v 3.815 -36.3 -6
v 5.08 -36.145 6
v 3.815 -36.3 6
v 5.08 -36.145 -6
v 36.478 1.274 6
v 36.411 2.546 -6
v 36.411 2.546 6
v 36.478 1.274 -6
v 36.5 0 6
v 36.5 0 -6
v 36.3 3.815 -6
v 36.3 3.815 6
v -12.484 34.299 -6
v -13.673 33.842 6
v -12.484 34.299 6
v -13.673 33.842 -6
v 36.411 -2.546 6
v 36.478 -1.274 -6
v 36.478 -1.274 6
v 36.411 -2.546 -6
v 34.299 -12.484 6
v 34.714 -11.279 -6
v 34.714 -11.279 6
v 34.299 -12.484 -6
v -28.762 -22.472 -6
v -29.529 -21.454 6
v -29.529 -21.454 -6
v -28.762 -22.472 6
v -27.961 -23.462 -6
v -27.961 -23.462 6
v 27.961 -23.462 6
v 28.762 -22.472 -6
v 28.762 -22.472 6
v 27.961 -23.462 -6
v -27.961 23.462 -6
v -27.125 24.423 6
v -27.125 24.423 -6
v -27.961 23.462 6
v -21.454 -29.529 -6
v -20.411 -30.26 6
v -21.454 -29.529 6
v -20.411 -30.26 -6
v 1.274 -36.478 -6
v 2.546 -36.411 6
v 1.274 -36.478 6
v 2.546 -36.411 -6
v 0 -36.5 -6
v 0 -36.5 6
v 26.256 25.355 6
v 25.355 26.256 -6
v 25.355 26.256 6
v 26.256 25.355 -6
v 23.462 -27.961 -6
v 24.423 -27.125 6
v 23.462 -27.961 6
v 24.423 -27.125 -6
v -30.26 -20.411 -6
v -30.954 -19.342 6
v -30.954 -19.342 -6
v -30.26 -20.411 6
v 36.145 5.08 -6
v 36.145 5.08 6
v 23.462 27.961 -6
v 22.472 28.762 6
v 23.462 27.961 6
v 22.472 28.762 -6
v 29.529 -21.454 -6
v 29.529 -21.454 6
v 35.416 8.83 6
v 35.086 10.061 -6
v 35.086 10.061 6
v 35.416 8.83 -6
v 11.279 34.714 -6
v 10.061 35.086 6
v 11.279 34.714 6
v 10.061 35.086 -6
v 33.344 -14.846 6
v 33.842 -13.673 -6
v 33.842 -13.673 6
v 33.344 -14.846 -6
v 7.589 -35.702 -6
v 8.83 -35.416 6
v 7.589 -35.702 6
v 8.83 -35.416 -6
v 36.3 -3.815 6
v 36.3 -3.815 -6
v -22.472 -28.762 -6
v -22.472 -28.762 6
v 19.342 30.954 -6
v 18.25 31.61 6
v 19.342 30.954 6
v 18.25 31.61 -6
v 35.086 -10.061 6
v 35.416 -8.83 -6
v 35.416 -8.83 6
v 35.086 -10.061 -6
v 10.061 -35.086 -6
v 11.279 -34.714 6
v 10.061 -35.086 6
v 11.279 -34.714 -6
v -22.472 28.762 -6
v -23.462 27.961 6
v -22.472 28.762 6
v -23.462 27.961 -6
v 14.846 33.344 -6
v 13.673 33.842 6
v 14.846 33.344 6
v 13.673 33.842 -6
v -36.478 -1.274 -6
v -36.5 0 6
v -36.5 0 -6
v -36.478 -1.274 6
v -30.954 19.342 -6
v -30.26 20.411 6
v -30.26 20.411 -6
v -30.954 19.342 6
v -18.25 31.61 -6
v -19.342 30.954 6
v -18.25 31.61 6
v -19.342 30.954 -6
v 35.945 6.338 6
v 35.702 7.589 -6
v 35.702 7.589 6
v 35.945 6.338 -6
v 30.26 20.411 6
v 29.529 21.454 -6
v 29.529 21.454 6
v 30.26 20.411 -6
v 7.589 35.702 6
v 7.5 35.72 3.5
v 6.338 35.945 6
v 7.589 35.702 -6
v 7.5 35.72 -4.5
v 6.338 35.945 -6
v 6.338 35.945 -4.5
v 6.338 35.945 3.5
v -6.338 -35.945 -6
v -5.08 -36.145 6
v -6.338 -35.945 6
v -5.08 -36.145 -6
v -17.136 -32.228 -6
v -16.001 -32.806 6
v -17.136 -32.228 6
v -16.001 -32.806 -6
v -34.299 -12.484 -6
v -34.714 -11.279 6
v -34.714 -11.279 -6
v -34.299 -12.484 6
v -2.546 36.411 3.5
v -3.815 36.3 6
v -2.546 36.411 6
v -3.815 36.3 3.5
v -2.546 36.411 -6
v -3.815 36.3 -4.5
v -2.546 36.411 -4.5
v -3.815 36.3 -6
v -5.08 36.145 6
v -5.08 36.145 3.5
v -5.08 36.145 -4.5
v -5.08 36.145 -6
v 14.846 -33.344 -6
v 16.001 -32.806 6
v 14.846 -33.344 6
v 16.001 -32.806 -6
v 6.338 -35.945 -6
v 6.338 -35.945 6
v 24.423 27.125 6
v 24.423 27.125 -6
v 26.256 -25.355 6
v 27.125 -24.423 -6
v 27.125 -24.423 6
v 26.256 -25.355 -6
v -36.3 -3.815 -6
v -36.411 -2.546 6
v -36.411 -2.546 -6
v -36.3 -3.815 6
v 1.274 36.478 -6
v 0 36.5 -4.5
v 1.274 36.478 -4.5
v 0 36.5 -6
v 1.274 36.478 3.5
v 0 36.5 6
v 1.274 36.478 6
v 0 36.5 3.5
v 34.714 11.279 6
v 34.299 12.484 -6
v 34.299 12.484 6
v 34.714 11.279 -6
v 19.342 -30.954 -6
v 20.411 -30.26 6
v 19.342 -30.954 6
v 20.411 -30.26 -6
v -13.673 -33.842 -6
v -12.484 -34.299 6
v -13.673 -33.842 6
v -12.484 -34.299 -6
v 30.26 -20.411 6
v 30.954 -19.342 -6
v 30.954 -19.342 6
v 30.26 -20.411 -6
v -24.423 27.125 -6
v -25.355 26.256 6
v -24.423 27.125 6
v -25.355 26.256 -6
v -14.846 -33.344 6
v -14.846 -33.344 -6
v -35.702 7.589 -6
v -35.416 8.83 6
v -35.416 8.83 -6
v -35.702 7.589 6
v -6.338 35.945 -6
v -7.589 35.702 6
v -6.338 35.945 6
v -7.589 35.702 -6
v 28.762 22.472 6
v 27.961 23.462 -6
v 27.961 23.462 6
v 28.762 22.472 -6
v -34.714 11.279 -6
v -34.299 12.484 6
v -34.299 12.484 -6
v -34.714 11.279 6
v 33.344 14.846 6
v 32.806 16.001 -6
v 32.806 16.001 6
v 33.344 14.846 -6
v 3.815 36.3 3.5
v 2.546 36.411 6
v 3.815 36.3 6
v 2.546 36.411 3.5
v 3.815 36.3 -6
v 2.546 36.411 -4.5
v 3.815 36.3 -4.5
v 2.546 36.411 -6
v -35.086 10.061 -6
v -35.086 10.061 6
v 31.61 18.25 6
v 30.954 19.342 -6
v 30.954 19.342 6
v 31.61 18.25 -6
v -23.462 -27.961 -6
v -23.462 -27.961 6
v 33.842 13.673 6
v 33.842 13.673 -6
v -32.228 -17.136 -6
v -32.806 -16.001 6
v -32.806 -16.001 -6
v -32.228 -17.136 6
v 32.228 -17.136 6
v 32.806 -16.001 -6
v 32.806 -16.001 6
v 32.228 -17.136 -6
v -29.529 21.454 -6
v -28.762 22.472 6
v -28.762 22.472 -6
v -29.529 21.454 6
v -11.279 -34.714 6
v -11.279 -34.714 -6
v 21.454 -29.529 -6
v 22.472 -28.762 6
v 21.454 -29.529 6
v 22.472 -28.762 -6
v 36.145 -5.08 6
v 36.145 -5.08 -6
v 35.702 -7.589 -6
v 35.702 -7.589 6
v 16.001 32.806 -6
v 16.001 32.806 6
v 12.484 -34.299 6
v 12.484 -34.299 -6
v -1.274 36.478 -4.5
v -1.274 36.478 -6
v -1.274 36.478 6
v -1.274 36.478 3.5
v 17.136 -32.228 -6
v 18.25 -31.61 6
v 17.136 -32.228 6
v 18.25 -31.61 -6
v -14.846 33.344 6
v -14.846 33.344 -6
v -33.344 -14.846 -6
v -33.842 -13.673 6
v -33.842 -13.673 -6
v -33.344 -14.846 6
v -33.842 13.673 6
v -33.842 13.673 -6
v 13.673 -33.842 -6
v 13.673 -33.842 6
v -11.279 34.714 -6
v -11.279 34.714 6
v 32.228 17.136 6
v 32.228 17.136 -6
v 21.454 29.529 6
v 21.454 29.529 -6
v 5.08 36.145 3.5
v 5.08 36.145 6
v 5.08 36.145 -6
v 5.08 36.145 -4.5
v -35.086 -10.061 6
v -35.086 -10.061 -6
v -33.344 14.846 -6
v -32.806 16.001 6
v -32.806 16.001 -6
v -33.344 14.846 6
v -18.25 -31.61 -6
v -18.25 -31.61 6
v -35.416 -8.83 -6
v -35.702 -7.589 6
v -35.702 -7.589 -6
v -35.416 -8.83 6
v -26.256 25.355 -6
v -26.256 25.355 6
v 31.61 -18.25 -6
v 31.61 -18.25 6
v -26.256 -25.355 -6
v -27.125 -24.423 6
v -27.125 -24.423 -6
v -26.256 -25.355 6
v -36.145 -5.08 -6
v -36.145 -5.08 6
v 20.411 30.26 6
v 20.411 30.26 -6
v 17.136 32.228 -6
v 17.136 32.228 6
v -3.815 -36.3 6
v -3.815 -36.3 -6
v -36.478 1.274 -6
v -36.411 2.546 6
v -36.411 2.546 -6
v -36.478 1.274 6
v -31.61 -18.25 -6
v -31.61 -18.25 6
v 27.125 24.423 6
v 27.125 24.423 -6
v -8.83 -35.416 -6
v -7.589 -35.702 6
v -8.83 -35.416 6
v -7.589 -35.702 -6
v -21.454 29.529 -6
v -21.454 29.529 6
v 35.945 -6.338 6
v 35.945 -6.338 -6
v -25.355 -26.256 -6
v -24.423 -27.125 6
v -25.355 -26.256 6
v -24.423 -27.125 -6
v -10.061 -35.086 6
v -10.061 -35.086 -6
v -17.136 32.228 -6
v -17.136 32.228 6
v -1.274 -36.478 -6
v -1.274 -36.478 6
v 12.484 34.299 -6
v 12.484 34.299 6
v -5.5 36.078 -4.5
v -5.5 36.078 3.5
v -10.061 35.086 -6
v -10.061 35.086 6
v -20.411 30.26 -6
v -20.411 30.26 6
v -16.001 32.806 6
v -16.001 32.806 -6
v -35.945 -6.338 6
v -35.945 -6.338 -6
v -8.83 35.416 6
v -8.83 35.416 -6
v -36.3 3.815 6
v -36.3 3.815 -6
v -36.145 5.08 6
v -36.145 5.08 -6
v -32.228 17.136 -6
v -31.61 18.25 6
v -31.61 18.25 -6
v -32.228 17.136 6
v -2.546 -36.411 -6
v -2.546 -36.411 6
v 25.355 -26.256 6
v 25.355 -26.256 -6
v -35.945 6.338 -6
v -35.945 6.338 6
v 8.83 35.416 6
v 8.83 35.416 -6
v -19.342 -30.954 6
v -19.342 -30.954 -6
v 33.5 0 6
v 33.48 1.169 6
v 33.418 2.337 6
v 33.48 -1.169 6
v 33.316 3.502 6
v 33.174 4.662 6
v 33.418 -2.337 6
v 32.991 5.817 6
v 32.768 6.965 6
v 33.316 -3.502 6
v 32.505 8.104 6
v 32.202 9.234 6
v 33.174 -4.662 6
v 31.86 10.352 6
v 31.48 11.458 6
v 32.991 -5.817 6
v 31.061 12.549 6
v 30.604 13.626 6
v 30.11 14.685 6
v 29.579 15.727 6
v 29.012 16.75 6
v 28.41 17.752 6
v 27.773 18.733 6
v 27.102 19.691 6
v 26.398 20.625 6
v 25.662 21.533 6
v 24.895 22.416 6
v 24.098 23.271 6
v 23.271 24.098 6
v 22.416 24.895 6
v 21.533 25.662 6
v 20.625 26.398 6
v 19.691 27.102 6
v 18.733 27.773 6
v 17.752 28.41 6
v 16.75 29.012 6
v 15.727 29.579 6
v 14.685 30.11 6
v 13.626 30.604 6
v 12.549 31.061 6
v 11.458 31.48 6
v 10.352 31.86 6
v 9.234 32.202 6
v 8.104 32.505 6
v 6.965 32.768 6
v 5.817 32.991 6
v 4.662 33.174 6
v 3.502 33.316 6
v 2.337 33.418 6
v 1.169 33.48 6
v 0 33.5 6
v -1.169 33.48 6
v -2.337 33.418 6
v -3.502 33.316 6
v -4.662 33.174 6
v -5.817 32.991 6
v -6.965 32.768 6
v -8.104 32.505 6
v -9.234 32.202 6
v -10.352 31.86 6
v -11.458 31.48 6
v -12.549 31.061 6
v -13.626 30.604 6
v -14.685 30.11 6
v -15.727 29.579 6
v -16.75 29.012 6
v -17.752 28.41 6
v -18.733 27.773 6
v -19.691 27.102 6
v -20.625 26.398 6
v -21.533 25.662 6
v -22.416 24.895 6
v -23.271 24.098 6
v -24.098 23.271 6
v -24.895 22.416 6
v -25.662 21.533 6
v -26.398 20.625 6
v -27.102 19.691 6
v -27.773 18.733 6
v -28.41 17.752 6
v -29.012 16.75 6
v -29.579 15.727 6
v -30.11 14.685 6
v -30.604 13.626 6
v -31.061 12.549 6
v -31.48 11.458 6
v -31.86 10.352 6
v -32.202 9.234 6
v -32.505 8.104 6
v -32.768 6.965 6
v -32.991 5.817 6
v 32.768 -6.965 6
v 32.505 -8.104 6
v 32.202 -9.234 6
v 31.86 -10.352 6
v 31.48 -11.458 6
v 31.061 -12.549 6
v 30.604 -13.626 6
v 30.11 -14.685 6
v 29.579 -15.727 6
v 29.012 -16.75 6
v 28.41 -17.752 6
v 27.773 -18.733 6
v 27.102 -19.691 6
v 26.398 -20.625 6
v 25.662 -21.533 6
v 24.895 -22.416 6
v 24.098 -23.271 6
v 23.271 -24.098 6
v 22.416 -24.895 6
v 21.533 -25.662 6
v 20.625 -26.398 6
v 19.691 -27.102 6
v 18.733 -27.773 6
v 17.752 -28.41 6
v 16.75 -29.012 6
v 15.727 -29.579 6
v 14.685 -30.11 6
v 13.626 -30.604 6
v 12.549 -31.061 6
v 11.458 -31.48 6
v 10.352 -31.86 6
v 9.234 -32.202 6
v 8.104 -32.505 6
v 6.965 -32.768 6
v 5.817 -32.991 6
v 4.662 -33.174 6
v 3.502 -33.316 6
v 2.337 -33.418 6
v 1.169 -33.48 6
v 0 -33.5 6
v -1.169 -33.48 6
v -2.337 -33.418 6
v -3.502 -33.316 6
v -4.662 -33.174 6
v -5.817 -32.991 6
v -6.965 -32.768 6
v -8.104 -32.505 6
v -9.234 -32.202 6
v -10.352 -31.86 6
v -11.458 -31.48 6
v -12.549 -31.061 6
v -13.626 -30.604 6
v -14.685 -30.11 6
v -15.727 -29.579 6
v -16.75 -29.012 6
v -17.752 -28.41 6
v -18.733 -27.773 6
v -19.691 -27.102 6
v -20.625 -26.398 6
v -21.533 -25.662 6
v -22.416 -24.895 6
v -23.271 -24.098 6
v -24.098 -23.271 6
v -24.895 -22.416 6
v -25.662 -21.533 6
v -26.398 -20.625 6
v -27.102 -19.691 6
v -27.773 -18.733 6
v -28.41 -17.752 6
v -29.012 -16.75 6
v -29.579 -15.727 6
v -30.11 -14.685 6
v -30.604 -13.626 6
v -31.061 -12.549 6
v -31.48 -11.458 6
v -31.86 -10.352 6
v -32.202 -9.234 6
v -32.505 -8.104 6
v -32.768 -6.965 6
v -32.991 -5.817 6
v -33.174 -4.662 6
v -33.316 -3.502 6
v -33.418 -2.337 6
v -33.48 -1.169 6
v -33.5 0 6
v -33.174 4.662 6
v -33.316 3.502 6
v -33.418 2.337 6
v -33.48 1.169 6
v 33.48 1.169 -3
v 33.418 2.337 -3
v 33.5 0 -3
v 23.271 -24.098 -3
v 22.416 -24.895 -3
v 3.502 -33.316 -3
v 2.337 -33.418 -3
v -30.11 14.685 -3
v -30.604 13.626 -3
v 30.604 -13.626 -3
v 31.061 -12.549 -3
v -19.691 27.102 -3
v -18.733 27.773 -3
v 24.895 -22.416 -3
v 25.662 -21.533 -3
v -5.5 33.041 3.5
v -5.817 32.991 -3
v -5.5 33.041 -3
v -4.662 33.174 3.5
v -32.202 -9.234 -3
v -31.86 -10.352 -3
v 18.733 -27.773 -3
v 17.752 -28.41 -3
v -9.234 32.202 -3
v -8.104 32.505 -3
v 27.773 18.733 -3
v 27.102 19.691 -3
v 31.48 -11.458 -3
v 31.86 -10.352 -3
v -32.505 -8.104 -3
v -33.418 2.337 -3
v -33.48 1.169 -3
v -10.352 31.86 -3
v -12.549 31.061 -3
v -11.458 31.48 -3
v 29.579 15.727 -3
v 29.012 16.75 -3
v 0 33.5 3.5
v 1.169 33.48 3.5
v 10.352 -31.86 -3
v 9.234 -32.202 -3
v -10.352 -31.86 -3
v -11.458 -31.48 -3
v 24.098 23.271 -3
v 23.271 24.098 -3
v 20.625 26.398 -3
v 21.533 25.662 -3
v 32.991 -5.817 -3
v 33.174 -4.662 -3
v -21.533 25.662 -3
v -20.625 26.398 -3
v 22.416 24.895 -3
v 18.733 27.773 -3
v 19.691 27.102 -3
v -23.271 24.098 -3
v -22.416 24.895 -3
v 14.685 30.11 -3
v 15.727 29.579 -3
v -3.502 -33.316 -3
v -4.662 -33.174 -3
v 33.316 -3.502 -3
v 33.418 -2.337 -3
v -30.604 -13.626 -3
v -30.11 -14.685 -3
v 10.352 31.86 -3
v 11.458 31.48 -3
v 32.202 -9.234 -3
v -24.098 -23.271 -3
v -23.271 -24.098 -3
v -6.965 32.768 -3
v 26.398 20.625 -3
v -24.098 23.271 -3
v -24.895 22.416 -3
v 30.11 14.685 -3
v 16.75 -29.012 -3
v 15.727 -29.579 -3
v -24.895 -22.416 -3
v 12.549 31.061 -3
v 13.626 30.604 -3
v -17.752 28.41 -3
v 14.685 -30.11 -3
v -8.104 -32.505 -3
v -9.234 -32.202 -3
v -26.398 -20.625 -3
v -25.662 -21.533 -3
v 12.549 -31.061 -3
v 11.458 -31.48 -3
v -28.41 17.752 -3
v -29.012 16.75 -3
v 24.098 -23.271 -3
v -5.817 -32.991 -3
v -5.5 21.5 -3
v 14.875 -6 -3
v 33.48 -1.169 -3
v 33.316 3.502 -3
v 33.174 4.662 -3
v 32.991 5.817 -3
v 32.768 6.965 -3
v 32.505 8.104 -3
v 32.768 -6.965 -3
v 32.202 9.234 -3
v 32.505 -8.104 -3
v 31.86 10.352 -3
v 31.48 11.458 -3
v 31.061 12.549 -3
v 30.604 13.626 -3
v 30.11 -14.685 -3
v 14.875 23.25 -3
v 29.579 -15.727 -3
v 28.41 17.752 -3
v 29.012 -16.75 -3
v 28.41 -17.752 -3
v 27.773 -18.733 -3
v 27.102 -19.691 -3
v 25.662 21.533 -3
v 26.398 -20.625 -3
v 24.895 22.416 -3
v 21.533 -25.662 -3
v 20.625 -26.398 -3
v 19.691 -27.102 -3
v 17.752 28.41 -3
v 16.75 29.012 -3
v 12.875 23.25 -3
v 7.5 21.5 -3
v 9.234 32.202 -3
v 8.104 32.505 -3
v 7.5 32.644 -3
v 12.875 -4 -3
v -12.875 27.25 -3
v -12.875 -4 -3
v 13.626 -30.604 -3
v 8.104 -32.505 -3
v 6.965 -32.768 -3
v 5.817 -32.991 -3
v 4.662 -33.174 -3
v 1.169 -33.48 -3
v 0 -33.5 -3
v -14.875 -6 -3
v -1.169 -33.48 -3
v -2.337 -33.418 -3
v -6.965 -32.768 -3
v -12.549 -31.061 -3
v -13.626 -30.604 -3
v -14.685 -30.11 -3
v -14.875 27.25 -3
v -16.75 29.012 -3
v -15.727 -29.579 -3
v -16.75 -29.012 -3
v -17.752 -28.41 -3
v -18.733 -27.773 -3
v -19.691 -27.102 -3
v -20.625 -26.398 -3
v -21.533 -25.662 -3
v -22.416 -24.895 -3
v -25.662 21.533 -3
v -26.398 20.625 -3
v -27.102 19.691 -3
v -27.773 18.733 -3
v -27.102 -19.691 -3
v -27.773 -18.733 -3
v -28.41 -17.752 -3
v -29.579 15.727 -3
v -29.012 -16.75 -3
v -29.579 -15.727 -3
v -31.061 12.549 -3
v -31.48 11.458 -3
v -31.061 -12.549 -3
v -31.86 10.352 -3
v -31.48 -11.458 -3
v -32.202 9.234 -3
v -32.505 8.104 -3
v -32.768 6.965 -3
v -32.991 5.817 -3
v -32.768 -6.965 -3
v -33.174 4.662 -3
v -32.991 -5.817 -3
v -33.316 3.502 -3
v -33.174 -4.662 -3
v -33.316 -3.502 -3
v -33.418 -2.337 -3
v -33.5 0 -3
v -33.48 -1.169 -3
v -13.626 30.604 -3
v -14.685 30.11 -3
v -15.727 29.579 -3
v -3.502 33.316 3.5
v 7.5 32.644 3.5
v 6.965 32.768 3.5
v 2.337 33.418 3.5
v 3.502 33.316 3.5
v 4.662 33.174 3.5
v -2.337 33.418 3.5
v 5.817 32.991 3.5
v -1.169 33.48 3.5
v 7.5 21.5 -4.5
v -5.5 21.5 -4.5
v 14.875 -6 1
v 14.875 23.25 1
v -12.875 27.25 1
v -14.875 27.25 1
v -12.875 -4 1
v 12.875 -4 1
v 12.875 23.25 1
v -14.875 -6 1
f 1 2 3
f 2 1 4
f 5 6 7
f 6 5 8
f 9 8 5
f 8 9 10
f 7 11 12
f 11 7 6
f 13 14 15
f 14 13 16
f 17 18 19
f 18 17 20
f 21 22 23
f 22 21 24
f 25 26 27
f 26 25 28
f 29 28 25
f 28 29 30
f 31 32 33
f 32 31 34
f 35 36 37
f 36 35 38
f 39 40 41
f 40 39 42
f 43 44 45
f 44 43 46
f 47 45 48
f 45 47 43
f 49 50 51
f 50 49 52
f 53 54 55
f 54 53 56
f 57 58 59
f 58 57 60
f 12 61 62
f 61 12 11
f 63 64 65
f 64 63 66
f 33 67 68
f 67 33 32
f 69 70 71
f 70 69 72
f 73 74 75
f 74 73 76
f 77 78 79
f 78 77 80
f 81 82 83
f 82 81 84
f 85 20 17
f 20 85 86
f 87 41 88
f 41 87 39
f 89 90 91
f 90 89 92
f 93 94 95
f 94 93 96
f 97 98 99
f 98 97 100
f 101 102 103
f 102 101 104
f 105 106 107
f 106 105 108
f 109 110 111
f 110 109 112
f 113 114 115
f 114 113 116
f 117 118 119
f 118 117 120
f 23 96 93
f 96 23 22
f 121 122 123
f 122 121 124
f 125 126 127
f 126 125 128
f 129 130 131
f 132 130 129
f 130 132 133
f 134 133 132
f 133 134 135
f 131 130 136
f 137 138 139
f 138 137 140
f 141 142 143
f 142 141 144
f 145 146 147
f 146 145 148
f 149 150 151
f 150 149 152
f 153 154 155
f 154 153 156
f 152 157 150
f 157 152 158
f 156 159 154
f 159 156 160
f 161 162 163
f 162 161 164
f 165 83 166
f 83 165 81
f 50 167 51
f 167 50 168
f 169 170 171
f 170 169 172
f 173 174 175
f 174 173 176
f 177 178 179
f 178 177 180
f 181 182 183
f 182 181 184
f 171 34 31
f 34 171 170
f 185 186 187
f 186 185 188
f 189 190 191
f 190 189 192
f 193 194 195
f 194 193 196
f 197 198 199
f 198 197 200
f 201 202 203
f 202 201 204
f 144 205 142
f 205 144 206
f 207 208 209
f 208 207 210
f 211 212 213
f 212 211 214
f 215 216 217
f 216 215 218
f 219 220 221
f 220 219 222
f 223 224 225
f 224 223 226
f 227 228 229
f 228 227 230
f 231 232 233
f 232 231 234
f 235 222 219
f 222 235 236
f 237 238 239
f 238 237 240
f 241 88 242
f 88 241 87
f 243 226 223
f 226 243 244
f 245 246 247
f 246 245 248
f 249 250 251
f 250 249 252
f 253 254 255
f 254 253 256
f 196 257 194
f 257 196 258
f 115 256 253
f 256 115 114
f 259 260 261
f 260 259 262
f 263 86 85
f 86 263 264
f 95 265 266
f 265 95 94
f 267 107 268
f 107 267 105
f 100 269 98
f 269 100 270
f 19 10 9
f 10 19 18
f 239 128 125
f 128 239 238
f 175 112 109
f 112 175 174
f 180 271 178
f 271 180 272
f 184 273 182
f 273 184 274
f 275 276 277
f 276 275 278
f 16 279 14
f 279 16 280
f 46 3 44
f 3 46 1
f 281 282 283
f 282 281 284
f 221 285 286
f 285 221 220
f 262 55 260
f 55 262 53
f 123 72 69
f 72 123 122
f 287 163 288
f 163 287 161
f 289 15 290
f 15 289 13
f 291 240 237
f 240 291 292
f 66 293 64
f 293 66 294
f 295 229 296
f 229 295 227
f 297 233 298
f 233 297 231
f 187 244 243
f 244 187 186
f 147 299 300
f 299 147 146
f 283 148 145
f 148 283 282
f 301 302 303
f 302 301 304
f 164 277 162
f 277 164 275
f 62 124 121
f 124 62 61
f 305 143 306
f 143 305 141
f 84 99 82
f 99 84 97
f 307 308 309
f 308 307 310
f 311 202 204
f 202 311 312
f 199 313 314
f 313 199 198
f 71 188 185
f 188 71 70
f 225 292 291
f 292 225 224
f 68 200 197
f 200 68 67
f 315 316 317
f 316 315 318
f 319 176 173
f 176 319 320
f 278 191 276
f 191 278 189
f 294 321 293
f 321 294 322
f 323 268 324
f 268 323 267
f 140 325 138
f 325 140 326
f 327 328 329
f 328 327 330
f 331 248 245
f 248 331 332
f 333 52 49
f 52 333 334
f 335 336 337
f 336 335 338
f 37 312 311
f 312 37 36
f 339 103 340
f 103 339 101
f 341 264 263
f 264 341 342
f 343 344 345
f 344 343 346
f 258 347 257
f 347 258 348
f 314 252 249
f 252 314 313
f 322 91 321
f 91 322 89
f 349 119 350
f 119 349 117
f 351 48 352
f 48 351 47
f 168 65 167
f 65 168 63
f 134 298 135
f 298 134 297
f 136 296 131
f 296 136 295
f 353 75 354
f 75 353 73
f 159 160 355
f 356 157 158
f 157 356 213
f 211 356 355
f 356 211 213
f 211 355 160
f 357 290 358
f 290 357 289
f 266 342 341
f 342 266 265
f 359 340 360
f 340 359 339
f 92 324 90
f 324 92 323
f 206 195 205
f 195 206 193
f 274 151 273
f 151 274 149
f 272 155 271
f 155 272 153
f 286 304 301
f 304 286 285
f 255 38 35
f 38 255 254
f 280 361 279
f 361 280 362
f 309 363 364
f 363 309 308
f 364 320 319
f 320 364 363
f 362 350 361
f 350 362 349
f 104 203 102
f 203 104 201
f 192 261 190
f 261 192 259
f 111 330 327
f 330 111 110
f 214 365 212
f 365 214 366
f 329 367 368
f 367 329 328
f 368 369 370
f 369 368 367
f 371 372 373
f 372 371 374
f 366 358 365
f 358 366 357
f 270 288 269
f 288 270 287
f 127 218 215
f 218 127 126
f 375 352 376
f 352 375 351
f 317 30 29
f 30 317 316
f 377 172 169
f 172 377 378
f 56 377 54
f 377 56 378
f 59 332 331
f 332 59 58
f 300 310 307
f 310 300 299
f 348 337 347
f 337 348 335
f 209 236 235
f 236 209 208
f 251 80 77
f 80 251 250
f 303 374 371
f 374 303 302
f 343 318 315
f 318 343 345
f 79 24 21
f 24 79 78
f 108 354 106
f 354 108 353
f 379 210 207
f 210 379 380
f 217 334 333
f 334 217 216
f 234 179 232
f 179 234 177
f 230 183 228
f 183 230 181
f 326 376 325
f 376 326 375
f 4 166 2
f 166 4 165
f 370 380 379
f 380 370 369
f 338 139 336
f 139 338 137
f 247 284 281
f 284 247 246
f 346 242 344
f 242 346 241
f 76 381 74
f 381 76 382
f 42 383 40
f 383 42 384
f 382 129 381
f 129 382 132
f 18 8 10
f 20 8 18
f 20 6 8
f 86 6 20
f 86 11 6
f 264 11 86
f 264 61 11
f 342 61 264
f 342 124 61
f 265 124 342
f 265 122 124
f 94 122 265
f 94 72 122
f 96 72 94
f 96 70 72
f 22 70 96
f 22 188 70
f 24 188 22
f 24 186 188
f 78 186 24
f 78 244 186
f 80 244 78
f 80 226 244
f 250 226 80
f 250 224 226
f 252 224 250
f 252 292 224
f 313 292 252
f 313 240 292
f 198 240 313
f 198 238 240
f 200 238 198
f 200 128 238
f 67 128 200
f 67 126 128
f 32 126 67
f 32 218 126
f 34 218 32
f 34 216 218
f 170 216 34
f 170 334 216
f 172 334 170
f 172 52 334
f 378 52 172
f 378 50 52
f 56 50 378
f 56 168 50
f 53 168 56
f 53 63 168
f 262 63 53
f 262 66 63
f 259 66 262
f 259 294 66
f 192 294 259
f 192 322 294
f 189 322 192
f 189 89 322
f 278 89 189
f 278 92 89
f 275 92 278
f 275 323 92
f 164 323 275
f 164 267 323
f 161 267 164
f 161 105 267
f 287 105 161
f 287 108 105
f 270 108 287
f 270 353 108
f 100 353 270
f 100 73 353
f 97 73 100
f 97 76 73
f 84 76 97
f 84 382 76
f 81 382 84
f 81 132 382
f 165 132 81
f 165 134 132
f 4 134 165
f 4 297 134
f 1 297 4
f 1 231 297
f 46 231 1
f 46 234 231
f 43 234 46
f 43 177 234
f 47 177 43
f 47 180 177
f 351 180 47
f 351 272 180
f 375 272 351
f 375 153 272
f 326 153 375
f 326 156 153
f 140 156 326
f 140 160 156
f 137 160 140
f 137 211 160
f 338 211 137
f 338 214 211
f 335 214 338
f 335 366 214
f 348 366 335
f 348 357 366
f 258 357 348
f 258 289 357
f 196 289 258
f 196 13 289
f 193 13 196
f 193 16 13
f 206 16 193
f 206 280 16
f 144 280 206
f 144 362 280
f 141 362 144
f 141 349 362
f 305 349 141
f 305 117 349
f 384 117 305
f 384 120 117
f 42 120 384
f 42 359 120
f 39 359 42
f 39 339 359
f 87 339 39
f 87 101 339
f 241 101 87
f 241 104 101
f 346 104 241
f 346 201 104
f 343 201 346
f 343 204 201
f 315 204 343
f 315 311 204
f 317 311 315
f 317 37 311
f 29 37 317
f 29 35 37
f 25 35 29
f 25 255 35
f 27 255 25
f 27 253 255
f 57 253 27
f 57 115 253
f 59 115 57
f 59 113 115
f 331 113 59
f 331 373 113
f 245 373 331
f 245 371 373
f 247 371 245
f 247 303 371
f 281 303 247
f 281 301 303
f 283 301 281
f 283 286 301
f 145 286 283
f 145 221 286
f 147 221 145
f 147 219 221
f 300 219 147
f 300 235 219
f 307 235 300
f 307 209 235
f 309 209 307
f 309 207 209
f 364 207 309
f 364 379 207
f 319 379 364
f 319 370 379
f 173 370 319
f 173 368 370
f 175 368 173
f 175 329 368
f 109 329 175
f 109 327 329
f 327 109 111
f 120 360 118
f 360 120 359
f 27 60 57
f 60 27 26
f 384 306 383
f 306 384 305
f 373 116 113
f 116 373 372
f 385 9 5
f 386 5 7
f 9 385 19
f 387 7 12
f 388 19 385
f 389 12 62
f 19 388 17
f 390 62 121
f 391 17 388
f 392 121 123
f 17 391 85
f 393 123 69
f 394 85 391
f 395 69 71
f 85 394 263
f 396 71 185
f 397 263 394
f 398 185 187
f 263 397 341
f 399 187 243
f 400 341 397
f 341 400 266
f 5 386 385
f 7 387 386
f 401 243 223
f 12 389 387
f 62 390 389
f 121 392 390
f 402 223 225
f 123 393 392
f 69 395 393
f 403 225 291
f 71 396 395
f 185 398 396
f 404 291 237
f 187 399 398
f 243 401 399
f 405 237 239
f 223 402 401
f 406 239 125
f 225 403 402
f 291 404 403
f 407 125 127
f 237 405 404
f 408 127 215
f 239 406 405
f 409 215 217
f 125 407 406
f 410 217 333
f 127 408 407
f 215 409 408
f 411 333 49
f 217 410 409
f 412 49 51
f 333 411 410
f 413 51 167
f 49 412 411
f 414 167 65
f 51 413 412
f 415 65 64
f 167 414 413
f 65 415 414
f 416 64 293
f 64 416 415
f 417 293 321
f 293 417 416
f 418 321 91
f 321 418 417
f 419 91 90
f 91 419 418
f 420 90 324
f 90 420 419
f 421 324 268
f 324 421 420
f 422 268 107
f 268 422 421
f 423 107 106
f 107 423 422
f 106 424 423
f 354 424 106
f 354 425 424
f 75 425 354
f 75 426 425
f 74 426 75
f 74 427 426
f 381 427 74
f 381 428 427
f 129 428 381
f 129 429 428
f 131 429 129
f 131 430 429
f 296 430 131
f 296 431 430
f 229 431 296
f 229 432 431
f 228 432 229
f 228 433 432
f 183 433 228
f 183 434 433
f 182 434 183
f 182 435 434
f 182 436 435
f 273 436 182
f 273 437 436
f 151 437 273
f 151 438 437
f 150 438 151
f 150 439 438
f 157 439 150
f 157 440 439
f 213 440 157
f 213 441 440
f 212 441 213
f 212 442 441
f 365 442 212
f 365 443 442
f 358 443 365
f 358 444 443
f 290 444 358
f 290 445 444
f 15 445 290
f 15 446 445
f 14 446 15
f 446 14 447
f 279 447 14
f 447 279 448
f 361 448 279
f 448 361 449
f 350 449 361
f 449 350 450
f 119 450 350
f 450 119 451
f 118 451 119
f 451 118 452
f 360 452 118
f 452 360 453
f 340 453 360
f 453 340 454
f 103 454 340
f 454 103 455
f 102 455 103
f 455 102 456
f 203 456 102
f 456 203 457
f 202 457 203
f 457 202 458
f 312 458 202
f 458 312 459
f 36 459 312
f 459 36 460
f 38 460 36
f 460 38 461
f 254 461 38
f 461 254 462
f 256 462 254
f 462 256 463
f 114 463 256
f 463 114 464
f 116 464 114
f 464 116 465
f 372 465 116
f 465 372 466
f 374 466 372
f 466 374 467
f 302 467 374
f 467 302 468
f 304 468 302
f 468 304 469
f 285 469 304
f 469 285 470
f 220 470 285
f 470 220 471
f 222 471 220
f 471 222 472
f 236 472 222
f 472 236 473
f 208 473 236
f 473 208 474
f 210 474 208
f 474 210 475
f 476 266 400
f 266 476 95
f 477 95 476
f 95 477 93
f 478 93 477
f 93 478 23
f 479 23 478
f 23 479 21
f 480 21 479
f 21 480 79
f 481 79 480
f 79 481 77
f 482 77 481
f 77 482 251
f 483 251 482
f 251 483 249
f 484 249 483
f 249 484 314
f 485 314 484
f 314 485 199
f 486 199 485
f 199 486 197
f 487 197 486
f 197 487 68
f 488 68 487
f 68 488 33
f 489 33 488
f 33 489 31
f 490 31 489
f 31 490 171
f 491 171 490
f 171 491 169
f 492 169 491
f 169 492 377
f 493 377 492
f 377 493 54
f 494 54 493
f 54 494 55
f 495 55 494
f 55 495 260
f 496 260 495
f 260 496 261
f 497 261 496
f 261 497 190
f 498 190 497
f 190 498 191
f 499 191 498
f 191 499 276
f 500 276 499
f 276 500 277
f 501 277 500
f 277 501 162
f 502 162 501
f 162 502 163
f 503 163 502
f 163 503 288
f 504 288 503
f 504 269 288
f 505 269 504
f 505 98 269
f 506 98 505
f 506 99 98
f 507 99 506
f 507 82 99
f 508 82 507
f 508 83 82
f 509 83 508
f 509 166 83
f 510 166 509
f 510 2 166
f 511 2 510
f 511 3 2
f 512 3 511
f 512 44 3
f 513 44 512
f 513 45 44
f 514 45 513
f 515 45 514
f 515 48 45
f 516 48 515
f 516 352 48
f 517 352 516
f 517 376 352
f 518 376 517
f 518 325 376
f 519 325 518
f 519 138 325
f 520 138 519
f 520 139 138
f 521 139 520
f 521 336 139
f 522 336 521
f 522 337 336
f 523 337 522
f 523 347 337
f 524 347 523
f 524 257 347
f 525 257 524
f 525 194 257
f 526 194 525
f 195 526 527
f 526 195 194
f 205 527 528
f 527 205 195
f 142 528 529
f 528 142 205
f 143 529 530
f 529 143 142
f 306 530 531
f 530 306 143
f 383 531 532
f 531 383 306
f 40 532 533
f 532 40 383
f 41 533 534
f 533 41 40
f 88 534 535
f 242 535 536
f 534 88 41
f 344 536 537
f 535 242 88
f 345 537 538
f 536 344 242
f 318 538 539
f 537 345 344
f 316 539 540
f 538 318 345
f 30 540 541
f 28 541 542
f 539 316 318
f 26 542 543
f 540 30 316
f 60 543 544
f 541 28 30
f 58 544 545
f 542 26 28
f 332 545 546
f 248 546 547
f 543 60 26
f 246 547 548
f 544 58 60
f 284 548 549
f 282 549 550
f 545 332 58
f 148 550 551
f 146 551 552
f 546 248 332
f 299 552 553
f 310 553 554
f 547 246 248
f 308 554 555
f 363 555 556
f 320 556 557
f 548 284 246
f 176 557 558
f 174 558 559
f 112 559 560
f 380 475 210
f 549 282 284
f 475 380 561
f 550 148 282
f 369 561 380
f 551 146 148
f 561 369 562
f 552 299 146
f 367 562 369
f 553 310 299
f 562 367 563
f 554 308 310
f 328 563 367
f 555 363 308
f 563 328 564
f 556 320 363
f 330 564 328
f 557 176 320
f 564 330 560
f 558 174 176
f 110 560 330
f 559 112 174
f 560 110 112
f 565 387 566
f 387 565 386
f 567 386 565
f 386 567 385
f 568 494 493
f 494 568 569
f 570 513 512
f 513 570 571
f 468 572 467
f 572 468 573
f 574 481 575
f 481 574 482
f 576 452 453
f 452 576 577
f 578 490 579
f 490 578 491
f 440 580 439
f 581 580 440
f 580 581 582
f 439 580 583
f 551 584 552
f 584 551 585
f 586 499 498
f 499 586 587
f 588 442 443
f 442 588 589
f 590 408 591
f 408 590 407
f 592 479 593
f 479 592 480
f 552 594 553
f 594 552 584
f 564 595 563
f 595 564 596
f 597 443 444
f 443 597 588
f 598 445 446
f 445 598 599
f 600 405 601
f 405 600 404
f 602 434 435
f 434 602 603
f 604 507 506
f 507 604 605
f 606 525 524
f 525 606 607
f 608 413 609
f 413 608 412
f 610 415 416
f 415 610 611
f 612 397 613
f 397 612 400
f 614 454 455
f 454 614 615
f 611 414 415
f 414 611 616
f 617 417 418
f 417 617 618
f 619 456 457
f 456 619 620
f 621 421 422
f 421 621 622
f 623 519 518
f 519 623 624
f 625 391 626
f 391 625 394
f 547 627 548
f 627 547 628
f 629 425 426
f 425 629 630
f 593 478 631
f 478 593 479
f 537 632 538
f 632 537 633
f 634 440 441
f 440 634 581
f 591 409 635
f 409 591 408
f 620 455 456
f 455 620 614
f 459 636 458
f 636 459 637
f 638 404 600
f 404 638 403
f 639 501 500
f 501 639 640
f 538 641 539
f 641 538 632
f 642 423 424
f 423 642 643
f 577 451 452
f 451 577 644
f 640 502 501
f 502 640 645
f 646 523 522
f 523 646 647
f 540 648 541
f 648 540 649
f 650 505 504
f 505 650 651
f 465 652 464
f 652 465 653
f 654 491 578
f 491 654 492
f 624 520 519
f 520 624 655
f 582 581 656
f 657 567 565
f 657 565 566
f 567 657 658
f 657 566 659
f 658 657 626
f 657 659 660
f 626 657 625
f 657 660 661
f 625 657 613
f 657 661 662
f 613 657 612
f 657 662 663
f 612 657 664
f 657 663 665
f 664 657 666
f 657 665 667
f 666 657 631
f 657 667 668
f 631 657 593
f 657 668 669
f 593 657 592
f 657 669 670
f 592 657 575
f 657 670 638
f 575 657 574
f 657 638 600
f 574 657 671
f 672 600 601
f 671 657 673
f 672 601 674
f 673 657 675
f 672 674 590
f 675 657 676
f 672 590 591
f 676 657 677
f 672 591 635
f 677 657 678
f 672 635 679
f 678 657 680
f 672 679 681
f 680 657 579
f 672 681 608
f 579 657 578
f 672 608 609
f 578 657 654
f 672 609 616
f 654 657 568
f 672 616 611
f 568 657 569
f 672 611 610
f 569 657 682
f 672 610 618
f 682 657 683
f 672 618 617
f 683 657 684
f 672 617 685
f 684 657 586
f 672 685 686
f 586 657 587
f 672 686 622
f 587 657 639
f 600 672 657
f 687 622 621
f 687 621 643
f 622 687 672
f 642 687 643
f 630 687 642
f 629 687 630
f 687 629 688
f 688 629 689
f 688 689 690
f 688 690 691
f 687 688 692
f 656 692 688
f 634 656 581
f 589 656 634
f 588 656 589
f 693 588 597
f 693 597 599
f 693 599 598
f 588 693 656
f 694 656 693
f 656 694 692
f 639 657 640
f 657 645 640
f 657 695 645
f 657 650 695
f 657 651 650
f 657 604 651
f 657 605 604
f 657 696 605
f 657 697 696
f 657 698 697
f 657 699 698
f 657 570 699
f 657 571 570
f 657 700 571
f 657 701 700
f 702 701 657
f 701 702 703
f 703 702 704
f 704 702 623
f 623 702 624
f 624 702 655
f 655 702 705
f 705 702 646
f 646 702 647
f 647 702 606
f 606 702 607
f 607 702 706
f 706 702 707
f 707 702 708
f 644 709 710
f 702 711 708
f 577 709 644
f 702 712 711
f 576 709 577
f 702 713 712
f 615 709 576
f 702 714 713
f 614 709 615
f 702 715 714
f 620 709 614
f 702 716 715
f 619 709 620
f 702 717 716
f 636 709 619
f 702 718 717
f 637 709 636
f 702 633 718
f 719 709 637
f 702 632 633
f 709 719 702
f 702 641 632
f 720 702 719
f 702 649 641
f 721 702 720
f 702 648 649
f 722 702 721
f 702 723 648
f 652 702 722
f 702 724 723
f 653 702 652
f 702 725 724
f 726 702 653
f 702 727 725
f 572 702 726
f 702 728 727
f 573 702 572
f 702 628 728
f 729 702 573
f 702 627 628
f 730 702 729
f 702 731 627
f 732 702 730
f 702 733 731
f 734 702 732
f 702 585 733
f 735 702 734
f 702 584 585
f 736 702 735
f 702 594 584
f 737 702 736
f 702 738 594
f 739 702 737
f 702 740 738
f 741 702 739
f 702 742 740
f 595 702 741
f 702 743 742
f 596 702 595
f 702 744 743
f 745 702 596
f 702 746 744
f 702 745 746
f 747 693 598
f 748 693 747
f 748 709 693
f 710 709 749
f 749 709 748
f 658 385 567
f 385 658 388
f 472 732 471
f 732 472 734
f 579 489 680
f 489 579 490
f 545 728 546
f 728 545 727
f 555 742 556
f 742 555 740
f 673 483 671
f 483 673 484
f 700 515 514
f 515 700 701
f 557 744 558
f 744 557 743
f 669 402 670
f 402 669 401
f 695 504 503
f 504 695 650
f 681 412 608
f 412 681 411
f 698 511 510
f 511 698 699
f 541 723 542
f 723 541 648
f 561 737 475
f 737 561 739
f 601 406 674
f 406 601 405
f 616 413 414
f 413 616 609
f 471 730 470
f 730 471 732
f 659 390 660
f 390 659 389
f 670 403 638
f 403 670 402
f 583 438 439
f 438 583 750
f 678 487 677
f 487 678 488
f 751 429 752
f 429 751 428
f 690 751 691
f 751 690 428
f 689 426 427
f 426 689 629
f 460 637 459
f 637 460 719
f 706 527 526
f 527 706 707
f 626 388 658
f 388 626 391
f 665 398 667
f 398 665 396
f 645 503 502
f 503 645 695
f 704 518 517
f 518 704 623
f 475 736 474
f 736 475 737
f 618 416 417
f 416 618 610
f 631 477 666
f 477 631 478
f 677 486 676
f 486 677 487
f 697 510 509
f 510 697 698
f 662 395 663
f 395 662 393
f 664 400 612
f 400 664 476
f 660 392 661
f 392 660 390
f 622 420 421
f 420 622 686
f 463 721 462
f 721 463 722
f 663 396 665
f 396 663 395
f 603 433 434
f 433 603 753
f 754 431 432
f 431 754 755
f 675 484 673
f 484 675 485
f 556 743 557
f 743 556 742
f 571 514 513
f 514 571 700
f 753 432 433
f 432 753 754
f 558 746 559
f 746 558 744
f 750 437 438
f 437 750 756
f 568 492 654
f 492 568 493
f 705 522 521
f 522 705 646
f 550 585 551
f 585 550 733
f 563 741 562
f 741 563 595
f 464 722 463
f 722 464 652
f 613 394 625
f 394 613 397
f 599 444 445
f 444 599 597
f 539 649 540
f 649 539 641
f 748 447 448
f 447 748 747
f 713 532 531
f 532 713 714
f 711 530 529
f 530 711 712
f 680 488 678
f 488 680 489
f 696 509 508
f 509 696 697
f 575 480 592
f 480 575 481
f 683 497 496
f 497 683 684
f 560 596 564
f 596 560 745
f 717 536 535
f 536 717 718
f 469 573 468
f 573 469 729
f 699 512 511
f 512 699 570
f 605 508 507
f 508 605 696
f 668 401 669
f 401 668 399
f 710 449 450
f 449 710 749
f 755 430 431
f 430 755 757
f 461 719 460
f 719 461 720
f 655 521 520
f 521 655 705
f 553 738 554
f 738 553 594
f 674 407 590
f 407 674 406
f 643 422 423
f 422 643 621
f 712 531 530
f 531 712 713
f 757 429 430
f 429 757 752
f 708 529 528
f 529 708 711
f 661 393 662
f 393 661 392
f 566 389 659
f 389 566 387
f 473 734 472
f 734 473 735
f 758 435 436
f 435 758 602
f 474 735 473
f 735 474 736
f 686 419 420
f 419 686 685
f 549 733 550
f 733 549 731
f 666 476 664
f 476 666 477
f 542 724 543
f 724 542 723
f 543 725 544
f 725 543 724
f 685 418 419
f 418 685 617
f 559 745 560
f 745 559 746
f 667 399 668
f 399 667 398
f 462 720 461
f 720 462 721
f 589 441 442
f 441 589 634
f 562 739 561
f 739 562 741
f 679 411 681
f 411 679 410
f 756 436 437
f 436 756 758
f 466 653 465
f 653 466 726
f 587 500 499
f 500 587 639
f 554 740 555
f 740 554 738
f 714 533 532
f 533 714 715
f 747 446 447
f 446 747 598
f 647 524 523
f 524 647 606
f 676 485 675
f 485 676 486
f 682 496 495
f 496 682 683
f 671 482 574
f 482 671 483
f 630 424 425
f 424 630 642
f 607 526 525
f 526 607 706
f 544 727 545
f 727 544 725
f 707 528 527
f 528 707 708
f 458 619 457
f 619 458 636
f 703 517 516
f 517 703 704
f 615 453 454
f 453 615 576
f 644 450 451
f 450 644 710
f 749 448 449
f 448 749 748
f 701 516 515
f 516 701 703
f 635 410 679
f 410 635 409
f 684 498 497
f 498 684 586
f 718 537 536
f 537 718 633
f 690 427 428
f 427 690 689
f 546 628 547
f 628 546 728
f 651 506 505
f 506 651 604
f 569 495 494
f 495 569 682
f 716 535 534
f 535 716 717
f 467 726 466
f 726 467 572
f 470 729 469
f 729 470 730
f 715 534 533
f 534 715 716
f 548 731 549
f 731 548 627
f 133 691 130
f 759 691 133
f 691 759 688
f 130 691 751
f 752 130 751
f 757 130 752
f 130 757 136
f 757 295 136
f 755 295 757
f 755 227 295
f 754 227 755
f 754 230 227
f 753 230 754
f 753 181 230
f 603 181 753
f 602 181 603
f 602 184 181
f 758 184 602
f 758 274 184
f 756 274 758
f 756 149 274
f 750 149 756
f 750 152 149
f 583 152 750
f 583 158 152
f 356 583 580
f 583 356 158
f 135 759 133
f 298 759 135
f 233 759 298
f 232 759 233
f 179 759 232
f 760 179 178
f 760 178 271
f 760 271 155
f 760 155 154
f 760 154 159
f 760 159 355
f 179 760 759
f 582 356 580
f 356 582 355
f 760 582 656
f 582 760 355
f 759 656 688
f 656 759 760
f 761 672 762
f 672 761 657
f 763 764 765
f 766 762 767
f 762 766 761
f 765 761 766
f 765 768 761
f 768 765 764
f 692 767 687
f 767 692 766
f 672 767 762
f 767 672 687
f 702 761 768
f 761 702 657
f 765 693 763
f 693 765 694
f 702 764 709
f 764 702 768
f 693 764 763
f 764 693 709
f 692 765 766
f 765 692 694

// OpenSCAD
$fn=180;

// NFC Board Type
NFC_Type = "PN532"; // [PN532,MFRC522]

// NFC Board Type
//NFC_Type = "MFRC522"; // [PN532,MFRC522]

// NFC Board Mounting
NFC_Mount_Type = "PressureFit"; // [PressureFit,Standoffs]

// NFC Board Mounting
//NFC_Mount_Type = "Standoffs"; // [PressureFit,Standoffs]

cylInnerDia = (NFC_Type=="PN532") ? 58 : 78; // 58 for PN532, 90 for MFRC522

cylThickness = 3;
cylOuterDia = cylInnerDia + cylThickness;
cylHeight = 15;
cylBaseDia = cylInnerDia + 15;
cylBaseHeight = 12; // Originally 15; 12 might work?
topLipHeight = 2;
topLipDia = 54;

standoffR1 = 7.63/2;
standoffR2 = 5.5/2;
standoffHole = 2.2/2;

wemosWidth = 25.75;
wemosLength = 34.25;
wemosThickness = 1.05;

pn532HoleDist = 37.3;
pn532BoardWidth = 43;
pn532BoardLength = 40.75;

mfrc522BoardWidth = 39;
mfrc522BoardLength = 59.75;
mfrc522HoleY1Dist = 25;
mfrc522HoleY2Dist = 34;
mfrc522HoleOffsets = 37.5;

amiiboBaseDia = 49.5;

//translate([0, 0, 15])
//tagLid();
//translate([0, 0, -cylBaseHeight/2-cylHeight/2-5])
tagBase();

module standoff(height)
{
    difference()
    {
        cylinder(r1=standoffR1, r2=standoffR2, h=height, center=true);
        cylinder(r=standoffHole, h=height+0.01, center=true);
    }
}

module tagLid()
{
    // Main Body
    difference()
    {
        cylinder(r1=cylBaseDia/2, r2=cylOuterDia/2, h=cylHeight, center=true);
        //translate([0, 0, -cylThickness])
        cylinder(r1=cylBaseDia/2-cylThickness, r2=cylOuterDia/2-cylThickness, h=cylHeight+0.01, center=true);
    }
    
    // Top
    topRoundRad = 2;
    translate([0, 0, cylHeight/2-topLipHeight-0.5])
    difference()
    {
        cylinder(r=cylOuterDia/2, h=cylThickness+topLipHeight, center=true);
        translate([0, 0, cylThickness/2+topRoundRad-0.5])
        minkowski()
        {
            cylinder(r=topLipDia/2-topRoundRad, h=topLipHeight+0.01-topRoundRad, center=true);
            sphere(r=topRoundRad, $fn=25);
        }
    }
    
    // Connecting 'lip'
    lipWidth=2;
    lipHeight=5;
    lipHeightExtra=4;
    translate([0, 0, -cylHeight/2+lipHeightExtra/2])
    difference()
    {
        cylinder(r=cylBaseDia/2-cylThickness, h=lipHeight+lipHeightExtra, center=true);
        cylinder(r=cylBaseDia/2-cylThickness-lipWidth, h=lipHeight+lipHeightExtra+0.01, center=true);
        translate([1, -2, -5])
        microUSBHole();
    }
    
    if (NFC_Type=="PN532")
    {
        if (NFC_Mount_Type=="PressureFit")
        {
            tagLidPressureFit(cylInnerDia-13.7, pn532BoardWidth);
        }
        else
        {
            tagLidPN532Standoffs();
        }
    }
    else
    {
        if (NFC_Mount_Type=="PressureFit")
        {
            tagLidPressureFit(cylInnerDia-5, mfrc522BoardWidth);
        }
        else
        {
            tagLidMFRC522Standoffs();
        }
    }
}

module tagLidMFRC522Standoffs()
{
    standoffHeight = 6;
    translate([0, mfrc522BoardLength/2-3, 0])
    rotate([180, 0, 0])
    union()
    {
        translate([mfrc522HoleY1Dist/2, 0, 0])
        standoff(standoffHeight);
        translate([-mfrc522HoleY1Dist/2, 0, 0])
        standoff(standoffHeight);
        
        translate([0, mfrc522HoleOffsets, 0])
        union()
        {
            translate([mfrc522HoleY2Dist/2, 0, 0])
            standoff(standoffHeight);
            translate([-mfrc522HoleY2Dist/2, 0, 0])
            standoff(standoffHeight);
        }
    }
}

module tagLidPN532Standoffs()
{
    standoffHeight = 6;
    translate([3, 0, 0])
    rotate([180, 0, 45])
    union()
    {
        translate([pn532HoleDist/2, 0, 0])
        standoff(standoffHeight);
        translate([-pn532HoleDist/2, 0, 0])
        standoff(standoffHeight);
    }
}

module tagLidPressureFit(railLen, width)
{
    mountH = 5;
    mountW = 2;

    translate([0, railLen/2, 3-mountH])
    rotate([0, 0, 180])
    union()
    {
        translate([width/2, 0, 0])
        cube([mountW, railLen, mountH]);
        translate([-width/2-mountW, 0, 0])
        cube([mountW, railLen, mountH]);
        //translate([-pn532BoardWidth/2, 0, 0])
        //cube([pn532BoardWidth, mountW, mountH]); 
    }
}

module tagBase()
{
    wemosYOffset = -1;
    difference()
    {
        cylinder(r=cylBaseDia/2, h=cylBaseHeight, center=true);
        translate([0, 0, cylThickness])
        cylinder(r=cylBaseDia/2-cylThickness, h=cylBaseHeight, center=true);
        
        //translate([0, wemosLength/2+wemosYOffset, -2.5])
        //#wemosBoard();
        
        // Hole for MicroUSB
        translate([1, -10, 0])
        microUSBHole();
    }
    
    wemosMountH = 4;
    wemosMountW = 2;        
    translate([0, cylBaseDia/2-wemosLength-8.25, -cylBaseHeight/2+cylThickness])
    union()
    {
        translate([wemosWidth/2, 0, 0])
        cube([wemosMountW, wemosLength-5, wemosMountH]);
        translate([-wemosWidth/2-wemosMountW, 0, 0])
        cube([wemosMountW, wemosLength-1, wemosMountH]);
        translate([-wemosWidth/2, 0, 0])
        cube([wemosWidth, wemosMountW, wemosMountH]); 
    }
}

module microUSBHole()
{
    microUSB_W = 13;
    microUSB_H = 8;
    
    translate([-microUSB_W/2, cylBaseDia/2-cylThickness-2, -cylBaseHeight/2+cylThickness-1.5])
    cube([microUSB_W, 20, microUSB_H]);
}

module wemosBoard()
{
    color("blue")
    difference()
    {
        cube([wemosWidth, wemosLength, wemosThickness], center=true);
    }
}
